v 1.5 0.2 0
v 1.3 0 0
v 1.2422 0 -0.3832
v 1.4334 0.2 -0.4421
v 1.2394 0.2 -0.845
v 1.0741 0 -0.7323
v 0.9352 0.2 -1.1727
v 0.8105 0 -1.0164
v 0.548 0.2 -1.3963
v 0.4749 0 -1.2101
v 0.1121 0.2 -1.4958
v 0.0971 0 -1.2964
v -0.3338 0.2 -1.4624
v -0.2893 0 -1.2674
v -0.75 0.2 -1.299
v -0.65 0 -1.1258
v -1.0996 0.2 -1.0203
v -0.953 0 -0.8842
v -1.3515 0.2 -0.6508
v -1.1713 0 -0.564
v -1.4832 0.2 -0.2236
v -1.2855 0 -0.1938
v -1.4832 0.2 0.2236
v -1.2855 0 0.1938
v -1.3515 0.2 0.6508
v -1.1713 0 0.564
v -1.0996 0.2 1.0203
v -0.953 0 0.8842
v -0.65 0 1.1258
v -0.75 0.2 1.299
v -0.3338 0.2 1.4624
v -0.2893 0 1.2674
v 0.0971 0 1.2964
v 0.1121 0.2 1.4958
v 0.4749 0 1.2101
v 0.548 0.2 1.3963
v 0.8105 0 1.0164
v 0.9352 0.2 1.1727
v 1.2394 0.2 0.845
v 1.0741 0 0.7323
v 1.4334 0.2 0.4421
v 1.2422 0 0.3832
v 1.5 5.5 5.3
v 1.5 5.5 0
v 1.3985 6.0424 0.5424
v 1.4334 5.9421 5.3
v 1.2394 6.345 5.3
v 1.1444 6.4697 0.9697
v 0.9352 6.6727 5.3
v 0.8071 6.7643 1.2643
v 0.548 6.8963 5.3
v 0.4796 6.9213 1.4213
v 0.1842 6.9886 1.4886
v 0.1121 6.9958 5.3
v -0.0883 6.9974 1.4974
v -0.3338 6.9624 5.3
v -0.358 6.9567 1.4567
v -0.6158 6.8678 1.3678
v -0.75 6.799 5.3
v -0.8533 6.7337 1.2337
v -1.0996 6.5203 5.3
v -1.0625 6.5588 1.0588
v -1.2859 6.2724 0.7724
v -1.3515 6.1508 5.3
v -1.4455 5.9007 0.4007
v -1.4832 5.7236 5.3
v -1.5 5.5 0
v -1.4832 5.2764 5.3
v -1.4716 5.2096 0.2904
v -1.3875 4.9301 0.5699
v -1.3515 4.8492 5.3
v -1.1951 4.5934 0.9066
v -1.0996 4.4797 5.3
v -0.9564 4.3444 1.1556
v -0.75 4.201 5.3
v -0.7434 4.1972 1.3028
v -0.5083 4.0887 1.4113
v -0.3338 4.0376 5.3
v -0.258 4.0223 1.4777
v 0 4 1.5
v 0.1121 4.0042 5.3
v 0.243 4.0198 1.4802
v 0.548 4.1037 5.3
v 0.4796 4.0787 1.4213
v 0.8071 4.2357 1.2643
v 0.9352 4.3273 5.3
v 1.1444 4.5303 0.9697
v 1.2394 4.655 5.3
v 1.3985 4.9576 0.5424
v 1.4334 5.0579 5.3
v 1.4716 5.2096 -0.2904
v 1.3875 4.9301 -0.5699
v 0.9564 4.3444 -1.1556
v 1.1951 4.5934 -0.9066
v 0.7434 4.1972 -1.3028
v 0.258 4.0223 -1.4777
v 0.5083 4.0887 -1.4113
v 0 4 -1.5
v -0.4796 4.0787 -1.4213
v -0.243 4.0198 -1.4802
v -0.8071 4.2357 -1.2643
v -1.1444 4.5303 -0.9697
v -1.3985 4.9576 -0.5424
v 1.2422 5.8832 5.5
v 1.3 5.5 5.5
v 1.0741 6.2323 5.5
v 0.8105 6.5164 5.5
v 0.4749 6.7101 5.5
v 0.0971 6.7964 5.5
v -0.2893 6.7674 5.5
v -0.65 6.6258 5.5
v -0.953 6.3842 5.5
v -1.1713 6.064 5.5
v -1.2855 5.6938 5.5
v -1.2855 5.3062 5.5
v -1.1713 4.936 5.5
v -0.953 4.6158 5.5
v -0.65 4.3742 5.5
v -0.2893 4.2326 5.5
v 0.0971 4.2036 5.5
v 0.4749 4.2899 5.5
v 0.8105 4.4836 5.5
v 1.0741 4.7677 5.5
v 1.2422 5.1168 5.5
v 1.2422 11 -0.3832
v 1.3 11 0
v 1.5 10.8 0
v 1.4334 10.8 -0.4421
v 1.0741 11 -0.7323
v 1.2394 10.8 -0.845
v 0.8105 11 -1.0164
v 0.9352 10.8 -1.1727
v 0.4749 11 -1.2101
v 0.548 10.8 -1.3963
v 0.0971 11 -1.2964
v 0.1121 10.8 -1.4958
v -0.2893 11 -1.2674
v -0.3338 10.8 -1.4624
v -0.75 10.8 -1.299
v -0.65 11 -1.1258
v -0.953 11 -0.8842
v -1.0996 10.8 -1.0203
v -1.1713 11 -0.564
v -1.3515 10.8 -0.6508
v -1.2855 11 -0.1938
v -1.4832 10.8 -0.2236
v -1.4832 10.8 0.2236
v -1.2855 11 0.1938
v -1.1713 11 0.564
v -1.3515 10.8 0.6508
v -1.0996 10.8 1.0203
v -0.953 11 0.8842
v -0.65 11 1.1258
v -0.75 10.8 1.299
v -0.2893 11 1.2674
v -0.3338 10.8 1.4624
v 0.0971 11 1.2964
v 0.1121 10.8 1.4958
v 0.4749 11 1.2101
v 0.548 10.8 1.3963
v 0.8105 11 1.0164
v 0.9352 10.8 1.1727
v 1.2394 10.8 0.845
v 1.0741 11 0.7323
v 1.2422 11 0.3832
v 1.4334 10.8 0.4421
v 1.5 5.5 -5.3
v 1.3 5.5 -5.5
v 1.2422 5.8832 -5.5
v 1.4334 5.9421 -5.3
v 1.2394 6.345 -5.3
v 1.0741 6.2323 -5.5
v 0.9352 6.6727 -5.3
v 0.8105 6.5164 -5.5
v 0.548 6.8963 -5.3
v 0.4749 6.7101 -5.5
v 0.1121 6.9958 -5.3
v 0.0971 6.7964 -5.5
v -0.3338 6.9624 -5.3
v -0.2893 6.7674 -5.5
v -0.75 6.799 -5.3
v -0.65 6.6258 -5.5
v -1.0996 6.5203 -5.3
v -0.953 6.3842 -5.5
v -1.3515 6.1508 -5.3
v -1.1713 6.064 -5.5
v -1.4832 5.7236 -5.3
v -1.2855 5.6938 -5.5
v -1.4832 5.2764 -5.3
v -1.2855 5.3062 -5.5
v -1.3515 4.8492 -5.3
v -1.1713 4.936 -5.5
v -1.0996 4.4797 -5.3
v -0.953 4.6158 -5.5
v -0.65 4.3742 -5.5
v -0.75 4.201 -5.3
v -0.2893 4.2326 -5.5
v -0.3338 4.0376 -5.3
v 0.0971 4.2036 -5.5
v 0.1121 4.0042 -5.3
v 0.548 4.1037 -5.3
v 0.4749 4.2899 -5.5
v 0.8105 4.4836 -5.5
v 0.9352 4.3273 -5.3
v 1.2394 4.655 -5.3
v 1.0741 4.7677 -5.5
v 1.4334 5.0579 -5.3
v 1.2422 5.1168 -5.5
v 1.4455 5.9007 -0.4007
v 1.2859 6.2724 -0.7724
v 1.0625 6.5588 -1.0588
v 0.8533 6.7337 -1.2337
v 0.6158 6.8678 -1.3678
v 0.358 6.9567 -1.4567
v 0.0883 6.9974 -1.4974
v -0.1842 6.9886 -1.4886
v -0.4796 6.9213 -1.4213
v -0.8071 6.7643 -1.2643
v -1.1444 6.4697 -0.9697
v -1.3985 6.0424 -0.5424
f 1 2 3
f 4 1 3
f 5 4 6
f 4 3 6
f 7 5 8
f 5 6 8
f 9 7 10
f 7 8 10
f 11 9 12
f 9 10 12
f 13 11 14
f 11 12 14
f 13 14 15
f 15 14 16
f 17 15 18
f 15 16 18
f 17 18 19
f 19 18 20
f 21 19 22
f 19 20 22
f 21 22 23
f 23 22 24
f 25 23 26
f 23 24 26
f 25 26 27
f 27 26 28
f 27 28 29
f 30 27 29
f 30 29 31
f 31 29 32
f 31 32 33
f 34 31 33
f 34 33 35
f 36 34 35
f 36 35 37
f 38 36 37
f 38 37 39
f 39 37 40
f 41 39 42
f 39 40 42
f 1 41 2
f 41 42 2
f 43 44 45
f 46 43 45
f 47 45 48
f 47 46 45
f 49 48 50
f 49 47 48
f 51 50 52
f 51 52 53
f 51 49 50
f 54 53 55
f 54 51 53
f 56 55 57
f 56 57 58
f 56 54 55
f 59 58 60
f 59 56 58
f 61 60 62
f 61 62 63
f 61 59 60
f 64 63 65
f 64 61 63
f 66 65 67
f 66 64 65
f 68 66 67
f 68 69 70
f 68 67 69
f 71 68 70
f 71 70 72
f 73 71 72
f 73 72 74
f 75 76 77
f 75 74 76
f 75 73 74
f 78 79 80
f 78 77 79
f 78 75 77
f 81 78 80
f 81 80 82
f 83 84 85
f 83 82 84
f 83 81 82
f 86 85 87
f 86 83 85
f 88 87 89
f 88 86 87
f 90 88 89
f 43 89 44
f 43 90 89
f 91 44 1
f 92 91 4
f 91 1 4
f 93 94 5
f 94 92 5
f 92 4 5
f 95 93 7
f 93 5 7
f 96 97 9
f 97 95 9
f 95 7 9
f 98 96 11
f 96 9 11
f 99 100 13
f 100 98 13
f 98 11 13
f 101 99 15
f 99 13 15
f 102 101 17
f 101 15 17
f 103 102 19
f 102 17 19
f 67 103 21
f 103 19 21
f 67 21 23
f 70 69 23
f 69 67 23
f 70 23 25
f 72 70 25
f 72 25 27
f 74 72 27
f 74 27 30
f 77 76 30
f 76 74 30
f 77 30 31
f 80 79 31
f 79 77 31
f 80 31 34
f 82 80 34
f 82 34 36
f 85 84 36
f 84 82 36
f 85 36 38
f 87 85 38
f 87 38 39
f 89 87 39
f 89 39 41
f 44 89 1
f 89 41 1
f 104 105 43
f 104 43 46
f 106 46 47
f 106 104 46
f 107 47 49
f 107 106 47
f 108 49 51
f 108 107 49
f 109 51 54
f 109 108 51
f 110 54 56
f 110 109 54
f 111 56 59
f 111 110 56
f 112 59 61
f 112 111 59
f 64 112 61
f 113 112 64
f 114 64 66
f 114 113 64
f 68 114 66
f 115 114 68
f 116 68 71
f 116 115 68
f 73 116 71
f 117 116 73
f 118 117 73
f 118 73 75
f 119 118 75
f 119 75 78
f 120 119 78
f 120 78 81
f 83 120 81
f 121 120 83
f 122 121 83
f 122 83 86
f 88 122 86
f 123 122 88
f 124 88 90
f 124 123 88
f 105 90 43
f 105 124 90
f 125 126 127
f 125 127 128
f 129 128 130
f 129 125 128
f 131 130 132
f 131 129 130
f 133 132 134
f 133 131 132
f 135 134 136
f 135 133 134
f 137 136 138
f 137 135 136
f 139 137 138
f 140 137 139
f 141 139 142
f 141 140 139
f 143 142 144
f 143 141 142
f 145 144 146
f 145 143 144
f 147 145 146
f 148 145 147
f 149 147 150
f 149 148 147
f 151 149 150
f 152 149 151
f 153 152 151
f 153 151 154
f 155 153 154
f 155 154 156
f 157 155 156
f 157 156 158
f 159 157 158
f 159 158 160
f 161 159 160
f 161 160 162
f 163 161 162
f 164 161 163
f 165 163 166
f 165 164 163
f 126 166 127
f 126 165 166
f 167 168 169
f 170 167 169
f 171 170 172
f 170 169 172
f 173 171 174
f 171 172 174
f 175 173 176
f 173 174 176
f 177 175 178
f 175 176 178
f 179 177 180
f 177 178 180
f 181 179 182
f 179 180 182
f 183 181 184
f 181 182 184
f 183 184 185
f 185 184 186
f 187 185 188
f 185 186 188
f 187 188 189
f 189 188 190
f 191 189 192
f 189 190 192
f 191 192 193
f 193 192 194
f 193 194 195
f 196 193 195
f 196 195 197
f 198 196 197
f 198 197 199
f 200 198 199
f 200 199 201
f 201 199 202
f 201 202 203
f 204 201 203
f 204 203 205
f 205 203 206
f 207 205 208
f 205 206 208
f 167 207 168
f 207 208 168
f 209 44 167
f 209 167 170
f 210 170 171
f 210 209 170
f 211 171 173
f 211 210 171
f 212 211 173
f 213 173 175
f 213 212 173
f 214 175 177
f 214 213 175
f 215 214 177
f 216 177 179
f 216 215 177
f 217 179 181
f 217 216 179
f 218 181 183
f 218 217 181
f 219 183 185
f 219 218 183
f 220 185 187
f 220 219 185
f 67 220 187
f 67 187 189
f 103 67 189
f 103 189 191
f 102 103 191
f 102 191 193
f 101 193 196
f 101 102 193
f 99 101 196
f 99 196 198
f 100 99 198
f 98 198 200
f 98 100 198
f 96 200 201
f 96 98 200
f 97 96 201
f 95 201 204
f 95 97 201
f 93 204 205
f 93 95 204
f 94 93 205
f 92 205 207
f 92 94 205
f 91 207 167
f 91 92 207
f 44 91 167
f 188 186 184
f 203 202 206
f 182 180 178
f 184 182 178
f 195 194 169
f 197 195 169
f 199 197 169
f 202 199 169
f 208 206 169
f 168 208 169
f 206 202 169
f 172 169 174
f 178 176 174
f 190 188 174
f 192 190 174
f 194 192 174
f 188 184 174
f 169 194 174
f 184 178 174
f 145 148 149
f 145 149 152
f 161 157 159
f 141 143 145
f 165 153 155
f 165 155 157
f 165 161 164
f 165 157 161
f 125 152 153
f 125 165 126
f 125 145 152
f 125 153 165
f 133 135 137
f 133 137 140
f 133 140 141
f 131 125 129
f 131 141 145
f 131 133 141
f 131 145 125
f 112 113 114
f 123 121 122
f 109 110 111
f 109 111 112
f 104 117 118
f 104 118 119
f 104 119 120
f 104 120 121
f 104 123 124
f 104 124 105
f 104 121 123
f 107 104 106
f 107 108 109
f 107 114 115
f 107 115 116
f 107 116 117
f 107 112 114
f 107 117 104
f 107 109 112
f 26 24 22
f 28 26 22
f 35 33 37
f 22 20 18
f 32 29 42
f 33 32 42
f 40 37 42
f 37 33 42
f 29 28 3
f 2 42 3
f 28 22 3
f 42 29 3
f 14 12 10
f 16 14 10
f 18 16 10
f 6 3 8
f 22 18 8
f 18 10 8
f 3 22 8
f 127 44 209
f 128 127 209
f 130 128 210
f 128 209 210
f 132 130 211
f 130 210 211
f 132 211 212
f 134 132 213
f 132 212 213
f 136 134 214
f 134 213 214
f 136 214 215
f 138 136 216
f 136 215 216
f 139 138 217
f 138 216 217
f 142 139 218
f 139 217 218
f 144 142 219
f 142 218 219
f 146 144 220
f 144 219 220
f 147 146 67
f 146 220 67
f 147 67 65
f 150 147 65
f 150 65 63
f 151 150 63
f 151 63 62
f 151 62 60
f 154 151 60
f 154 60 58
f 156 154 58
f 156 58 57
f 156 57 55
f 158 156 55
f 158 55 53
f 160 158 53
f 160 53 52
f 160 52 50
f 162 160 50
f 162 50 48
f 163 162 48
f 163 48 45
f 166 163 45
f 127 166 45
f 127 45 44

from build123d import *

# Parameters (mm, degrees)
SKETCH_1_R      = 1.5
EXTRUDE_1_DEPTH = 11
SKETCH_2_R      = 1.5
EXTRUDE_2_DEPTH = 5.5
CHAMFER_1_SIZE  = 0.2


with BuildPart() as part:
    # 草图1 → 凸台-拉伸1 (new body)
    with BuildSketch(Plane(origin=(0, 0, 0), x_dir=(1, 0, 0), z_dir=(0, 1, 0))):
        Circle(SKETCH_1_R)
    extrude(amount=EXTRUDE_1_DEPTH)

    # 草图2 → 凸台-拉伸2 (add, symmetric)
    with BuildSketch(Plane.XY):
        with Locations((0, 5.5)):
            Circle(SKETCH_2_R)
    extrude(amount=EXTRUDE_2_DEPTH, both=True)

    # 倒角1
    chamfer_1_edges = [part.edges().sort_by_distance(p)[0] for p in [
        (-1.5, 0, 0),
        (-1.5, 11, 0),
        (-1.5, 5.5, -5.5),
        (-1.5, 5.5, 5.5),
    ]]
    chamfer(chamfer_1_edges, length=CHAMFER_1_SIZE)


solid = part.part
